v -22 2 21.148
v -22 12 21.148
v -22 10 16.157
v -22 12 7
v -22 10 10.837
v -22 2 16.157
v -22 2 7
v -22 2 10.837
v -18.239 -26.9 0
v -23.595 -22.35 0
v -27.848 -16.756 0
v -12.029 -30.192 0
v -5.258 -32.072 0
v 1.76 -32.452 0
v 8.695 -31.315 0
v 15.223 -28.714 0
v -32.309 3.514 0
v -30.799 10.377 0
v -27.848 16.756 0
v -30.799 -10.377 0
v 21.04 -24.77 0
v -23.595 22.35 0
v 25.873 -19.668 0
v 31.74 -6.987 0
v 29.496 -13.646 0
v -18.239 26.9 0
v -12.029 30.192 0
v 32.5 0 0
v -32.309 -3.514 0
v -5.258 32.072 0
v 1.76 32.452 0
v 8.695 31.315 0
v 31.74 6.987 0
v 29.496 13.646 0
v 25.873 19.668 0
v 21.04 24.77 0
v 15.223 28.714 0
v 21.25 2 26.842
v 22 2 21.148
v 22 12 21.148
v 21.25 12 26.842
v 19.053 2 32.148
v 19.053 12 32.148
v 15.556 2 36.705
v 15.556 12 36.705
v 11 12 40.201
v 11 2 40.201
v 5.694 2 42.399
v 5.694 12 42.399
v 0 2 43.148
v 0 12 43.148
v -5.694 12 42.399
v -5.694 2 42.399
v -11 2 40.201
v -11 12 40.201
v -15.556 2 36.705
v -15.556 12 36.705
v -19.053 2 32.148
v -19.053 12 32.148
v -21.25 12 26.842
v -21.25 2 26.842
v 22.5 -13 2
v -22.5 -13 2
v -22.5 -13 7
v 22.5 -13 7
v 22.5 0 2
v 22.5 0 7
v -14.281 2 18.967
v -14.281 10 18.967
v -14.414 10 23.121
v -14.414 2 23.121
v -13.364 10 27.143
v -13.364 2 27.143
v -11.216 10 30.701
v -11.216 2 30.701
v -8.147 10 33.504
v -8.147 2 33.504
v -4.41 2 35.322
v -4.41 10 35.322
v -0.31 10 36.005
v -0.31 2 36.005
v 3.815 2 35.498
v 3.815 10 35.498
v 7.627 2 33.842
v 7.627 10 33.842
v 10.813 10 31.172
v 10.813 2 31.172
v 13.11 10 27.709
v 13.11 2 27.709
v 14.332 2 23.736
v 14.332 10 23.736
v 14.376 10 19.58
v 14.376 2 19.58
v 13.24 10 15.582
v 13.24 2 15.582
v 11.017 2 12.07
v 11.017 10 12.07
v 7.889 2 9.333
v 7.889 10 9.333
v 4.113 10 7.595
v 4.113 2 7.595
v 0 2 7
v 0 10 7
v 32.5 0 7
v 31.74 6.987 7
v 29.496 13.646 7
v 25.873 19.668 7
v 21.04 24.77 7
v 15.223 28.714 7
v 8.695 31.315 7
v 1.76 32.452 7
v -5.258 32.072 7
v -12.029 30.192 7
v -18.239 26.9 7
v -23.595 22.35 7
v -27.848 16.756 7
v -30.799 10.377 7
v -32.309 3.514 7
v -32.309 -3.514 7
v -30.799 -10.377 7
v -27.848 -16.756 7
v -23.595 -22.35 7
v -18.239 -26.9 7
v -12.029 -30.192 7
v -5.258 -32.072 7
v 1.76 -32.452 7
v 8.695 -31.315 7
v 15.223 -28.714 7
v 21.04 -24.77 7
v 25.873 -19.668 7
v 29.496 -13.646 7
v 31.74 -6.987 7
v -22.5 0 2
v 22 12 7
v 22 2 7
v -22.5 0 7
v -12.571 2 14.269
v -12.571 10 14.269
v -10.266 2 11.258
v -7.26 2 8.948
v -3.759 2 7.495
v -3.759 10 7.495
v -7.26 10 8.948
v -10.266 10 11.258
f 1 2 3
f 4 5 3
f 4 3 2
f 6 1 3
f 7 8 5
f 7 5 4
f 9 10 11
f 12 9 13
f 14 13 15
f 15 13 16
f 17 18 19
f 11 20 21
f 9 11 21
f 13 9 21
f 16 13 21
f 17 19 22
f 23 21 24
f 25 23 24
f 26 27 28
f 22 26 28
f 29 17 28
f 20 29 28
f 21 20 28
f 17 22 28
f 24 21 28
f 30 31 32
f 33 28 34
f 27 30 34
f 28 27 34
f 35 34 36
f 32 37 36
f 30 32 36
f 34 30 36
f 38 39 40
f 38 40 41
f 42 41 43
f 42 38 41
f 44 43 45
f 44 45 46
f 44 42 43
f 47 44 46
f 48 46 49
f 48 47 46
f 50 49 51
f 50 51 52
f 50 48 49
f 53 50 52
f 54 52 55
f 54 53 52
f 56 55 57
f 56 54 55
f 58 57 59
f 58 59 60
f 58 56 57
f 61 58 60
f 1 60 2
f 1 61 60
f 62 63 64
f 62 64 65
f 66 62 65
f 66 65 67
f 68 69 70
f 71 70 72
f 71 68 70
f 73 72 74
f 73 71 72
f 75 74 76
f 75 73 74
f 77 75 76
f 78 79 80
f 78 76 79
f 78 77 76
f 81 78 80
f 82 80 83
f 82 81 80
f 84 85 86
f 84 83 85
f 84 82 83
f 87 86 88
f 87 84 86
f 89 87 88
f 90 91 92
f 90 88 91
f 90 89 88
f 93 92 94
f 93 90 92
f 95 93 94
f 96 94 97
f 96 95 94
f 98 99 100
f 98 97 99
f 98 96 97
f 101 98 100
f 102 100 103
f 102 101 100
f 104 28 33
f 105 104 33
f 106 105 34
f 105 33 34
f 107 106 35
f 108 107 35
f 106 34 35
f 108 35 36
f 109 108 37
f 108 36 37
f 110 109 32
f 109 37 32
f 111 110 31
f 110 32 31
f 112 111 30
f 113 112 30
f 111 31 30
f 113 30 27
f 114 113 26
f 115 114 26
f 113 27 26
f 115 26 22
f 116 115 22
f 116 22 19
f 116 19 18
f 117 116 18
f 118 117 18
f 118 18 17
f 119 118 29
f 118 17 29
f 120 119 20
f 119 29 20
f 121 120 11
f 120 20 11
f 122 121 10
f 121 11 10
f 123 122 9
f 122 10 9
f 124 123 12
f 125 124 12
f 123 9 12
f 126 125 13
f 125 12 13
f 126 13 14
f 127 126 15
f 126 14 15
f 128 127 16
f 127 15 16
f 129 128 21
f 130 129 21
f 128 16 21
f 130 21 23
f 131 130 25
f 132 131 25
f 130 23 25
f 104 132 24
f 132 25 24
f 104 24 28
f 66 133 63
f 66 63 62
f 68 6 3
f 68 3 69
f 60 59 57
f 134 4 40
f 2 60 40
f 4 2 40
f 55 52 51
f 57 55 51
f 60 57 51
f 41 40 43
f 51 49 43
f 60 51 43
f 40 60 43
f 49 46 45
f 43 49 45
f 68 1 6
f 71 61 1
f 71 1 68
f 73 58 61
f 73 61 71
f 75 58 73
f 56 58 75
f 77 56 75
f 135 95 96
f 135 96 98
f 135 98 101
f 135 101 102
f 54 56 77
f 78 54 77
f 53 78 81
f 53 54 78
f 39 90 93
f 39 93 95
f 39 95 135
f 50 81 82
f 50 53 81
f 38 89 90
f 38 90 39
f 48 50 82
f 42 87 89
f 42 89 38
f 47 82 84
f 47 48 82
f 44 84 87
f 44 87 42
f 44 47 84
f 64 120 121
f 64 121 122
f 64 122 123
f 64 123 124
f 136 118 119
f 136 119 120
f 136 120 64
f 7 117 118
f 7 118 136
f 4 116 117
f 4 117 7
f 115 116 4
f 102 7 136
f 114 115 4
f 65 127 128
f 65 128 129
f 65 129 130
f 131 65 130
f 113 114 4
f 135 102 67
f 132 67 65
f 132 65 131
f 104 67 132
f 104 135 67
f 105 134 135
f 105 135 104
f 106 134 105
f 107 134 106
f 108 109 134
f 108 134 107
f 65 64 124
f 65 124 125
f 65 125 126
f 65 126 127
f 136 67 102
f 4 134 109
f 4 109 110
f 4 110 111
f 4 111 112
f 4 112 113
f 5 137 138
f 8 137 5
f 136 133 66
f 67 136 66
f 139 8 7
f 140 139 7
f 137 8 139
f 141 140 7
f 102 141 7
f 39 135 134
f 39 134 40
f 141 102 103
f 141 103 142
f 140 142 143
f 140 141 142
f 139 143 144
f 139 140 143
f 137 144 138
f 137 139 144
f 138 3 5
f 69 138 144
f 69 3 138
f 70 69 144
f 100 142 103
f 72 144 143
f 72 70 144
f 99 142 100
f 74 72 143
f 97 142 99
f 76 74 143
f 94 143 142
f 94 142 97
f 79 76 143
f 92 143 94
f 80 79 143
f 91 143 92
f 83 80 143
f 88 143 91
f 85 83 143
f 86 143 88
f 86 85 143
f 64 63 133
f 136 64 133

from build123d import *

# Parameters (mm, degrees)
F0_R     = 32.5
F0_W     = 45
F0_H     = 13
F1_DEPTH = 7
F2_DEPTH = 2
F5_DEPTH = 10
F6_START = -8
F6_DEPTH = 2


with BuildPart() as f1:
    # F0 (on Top) → F1 (new body)
    with BuildSketch(Plane.XY):
        Circle(F0_R)
        with Locations((0, -6.5)):
            Rectangle(F0_W, F0_H, mode=Mode.SUBTRACT)
    extrude(amount=F1_DEPTH)

    # F0 (on Top) → F2 (join)
    with BuildSketch(Plane.XY):
        with Locations((0, -6.5)):
            Rectangle(F0_W, F0_H)
    extrude(amount=F2_DEPTH)

    # F4 (on offset) → F5 (join)
    with BuildSketch(Plane.XZ.offset(-2)):
        with BuildLine():
            ThreePointArc((-14.280714402, 18.9670594471), (9.3159717217, 32.6214478116), (-2.92e-08, 7))
            Line((-2.92e-08, 7), (22, 7))
            Line((22, 7), (22, 21.1483523101))
            ThreePointArc((22, 21.1483523101), (0, 43.1483523101), (-22, 21.1483523101))
            Line((-22, 21.1483523101), (-22, 16.1574692596))
            Line((-22, 16.1574692596), (-14.280714402, 18.9670594471))
        make_face()
        with BuildLine():
            ThreePointArc((-2.92e-08, 7), (-7.2603860428, 8.9479555621), (-12.5706136854, 14.2685963432))
            Line((-12.5706136854, 14.2685963432), (-22, 10.8365803972))
            Line((-22, 10.8365803972), (-22, 7))
            Line((-22, 7), (-2.92e-08, 7))
        make_face()
    extrude(amount=-F5_DEPTH)

    # F4 (on offset) → F6 (join)
    with BuildSketch(Plane.XZ.offset(-2).offset(F6_START)):
        with BuildLine():
            Line((-22, 10.8365803972), (-12.5706136854, 14.2685963432))
            ThreePointArc((-12.5706136854, 14.2685963432), (-7.2603860428, 8.9479555621), (-2.92e-08, 7))
            ThreePointArc((-2.92e-08, 7), (9.3159717217, 32.6214478116), (-14.280714402, 18.9670594471))
            Line((-14.280714402, 18.9670594471), (-22, 16.1574692596))
            Line((-22, 16.1574692596), (-22, 10.8365803972))
        make_face()
    extrude(amount=-F6_DEPTH)


solid = f1.part
